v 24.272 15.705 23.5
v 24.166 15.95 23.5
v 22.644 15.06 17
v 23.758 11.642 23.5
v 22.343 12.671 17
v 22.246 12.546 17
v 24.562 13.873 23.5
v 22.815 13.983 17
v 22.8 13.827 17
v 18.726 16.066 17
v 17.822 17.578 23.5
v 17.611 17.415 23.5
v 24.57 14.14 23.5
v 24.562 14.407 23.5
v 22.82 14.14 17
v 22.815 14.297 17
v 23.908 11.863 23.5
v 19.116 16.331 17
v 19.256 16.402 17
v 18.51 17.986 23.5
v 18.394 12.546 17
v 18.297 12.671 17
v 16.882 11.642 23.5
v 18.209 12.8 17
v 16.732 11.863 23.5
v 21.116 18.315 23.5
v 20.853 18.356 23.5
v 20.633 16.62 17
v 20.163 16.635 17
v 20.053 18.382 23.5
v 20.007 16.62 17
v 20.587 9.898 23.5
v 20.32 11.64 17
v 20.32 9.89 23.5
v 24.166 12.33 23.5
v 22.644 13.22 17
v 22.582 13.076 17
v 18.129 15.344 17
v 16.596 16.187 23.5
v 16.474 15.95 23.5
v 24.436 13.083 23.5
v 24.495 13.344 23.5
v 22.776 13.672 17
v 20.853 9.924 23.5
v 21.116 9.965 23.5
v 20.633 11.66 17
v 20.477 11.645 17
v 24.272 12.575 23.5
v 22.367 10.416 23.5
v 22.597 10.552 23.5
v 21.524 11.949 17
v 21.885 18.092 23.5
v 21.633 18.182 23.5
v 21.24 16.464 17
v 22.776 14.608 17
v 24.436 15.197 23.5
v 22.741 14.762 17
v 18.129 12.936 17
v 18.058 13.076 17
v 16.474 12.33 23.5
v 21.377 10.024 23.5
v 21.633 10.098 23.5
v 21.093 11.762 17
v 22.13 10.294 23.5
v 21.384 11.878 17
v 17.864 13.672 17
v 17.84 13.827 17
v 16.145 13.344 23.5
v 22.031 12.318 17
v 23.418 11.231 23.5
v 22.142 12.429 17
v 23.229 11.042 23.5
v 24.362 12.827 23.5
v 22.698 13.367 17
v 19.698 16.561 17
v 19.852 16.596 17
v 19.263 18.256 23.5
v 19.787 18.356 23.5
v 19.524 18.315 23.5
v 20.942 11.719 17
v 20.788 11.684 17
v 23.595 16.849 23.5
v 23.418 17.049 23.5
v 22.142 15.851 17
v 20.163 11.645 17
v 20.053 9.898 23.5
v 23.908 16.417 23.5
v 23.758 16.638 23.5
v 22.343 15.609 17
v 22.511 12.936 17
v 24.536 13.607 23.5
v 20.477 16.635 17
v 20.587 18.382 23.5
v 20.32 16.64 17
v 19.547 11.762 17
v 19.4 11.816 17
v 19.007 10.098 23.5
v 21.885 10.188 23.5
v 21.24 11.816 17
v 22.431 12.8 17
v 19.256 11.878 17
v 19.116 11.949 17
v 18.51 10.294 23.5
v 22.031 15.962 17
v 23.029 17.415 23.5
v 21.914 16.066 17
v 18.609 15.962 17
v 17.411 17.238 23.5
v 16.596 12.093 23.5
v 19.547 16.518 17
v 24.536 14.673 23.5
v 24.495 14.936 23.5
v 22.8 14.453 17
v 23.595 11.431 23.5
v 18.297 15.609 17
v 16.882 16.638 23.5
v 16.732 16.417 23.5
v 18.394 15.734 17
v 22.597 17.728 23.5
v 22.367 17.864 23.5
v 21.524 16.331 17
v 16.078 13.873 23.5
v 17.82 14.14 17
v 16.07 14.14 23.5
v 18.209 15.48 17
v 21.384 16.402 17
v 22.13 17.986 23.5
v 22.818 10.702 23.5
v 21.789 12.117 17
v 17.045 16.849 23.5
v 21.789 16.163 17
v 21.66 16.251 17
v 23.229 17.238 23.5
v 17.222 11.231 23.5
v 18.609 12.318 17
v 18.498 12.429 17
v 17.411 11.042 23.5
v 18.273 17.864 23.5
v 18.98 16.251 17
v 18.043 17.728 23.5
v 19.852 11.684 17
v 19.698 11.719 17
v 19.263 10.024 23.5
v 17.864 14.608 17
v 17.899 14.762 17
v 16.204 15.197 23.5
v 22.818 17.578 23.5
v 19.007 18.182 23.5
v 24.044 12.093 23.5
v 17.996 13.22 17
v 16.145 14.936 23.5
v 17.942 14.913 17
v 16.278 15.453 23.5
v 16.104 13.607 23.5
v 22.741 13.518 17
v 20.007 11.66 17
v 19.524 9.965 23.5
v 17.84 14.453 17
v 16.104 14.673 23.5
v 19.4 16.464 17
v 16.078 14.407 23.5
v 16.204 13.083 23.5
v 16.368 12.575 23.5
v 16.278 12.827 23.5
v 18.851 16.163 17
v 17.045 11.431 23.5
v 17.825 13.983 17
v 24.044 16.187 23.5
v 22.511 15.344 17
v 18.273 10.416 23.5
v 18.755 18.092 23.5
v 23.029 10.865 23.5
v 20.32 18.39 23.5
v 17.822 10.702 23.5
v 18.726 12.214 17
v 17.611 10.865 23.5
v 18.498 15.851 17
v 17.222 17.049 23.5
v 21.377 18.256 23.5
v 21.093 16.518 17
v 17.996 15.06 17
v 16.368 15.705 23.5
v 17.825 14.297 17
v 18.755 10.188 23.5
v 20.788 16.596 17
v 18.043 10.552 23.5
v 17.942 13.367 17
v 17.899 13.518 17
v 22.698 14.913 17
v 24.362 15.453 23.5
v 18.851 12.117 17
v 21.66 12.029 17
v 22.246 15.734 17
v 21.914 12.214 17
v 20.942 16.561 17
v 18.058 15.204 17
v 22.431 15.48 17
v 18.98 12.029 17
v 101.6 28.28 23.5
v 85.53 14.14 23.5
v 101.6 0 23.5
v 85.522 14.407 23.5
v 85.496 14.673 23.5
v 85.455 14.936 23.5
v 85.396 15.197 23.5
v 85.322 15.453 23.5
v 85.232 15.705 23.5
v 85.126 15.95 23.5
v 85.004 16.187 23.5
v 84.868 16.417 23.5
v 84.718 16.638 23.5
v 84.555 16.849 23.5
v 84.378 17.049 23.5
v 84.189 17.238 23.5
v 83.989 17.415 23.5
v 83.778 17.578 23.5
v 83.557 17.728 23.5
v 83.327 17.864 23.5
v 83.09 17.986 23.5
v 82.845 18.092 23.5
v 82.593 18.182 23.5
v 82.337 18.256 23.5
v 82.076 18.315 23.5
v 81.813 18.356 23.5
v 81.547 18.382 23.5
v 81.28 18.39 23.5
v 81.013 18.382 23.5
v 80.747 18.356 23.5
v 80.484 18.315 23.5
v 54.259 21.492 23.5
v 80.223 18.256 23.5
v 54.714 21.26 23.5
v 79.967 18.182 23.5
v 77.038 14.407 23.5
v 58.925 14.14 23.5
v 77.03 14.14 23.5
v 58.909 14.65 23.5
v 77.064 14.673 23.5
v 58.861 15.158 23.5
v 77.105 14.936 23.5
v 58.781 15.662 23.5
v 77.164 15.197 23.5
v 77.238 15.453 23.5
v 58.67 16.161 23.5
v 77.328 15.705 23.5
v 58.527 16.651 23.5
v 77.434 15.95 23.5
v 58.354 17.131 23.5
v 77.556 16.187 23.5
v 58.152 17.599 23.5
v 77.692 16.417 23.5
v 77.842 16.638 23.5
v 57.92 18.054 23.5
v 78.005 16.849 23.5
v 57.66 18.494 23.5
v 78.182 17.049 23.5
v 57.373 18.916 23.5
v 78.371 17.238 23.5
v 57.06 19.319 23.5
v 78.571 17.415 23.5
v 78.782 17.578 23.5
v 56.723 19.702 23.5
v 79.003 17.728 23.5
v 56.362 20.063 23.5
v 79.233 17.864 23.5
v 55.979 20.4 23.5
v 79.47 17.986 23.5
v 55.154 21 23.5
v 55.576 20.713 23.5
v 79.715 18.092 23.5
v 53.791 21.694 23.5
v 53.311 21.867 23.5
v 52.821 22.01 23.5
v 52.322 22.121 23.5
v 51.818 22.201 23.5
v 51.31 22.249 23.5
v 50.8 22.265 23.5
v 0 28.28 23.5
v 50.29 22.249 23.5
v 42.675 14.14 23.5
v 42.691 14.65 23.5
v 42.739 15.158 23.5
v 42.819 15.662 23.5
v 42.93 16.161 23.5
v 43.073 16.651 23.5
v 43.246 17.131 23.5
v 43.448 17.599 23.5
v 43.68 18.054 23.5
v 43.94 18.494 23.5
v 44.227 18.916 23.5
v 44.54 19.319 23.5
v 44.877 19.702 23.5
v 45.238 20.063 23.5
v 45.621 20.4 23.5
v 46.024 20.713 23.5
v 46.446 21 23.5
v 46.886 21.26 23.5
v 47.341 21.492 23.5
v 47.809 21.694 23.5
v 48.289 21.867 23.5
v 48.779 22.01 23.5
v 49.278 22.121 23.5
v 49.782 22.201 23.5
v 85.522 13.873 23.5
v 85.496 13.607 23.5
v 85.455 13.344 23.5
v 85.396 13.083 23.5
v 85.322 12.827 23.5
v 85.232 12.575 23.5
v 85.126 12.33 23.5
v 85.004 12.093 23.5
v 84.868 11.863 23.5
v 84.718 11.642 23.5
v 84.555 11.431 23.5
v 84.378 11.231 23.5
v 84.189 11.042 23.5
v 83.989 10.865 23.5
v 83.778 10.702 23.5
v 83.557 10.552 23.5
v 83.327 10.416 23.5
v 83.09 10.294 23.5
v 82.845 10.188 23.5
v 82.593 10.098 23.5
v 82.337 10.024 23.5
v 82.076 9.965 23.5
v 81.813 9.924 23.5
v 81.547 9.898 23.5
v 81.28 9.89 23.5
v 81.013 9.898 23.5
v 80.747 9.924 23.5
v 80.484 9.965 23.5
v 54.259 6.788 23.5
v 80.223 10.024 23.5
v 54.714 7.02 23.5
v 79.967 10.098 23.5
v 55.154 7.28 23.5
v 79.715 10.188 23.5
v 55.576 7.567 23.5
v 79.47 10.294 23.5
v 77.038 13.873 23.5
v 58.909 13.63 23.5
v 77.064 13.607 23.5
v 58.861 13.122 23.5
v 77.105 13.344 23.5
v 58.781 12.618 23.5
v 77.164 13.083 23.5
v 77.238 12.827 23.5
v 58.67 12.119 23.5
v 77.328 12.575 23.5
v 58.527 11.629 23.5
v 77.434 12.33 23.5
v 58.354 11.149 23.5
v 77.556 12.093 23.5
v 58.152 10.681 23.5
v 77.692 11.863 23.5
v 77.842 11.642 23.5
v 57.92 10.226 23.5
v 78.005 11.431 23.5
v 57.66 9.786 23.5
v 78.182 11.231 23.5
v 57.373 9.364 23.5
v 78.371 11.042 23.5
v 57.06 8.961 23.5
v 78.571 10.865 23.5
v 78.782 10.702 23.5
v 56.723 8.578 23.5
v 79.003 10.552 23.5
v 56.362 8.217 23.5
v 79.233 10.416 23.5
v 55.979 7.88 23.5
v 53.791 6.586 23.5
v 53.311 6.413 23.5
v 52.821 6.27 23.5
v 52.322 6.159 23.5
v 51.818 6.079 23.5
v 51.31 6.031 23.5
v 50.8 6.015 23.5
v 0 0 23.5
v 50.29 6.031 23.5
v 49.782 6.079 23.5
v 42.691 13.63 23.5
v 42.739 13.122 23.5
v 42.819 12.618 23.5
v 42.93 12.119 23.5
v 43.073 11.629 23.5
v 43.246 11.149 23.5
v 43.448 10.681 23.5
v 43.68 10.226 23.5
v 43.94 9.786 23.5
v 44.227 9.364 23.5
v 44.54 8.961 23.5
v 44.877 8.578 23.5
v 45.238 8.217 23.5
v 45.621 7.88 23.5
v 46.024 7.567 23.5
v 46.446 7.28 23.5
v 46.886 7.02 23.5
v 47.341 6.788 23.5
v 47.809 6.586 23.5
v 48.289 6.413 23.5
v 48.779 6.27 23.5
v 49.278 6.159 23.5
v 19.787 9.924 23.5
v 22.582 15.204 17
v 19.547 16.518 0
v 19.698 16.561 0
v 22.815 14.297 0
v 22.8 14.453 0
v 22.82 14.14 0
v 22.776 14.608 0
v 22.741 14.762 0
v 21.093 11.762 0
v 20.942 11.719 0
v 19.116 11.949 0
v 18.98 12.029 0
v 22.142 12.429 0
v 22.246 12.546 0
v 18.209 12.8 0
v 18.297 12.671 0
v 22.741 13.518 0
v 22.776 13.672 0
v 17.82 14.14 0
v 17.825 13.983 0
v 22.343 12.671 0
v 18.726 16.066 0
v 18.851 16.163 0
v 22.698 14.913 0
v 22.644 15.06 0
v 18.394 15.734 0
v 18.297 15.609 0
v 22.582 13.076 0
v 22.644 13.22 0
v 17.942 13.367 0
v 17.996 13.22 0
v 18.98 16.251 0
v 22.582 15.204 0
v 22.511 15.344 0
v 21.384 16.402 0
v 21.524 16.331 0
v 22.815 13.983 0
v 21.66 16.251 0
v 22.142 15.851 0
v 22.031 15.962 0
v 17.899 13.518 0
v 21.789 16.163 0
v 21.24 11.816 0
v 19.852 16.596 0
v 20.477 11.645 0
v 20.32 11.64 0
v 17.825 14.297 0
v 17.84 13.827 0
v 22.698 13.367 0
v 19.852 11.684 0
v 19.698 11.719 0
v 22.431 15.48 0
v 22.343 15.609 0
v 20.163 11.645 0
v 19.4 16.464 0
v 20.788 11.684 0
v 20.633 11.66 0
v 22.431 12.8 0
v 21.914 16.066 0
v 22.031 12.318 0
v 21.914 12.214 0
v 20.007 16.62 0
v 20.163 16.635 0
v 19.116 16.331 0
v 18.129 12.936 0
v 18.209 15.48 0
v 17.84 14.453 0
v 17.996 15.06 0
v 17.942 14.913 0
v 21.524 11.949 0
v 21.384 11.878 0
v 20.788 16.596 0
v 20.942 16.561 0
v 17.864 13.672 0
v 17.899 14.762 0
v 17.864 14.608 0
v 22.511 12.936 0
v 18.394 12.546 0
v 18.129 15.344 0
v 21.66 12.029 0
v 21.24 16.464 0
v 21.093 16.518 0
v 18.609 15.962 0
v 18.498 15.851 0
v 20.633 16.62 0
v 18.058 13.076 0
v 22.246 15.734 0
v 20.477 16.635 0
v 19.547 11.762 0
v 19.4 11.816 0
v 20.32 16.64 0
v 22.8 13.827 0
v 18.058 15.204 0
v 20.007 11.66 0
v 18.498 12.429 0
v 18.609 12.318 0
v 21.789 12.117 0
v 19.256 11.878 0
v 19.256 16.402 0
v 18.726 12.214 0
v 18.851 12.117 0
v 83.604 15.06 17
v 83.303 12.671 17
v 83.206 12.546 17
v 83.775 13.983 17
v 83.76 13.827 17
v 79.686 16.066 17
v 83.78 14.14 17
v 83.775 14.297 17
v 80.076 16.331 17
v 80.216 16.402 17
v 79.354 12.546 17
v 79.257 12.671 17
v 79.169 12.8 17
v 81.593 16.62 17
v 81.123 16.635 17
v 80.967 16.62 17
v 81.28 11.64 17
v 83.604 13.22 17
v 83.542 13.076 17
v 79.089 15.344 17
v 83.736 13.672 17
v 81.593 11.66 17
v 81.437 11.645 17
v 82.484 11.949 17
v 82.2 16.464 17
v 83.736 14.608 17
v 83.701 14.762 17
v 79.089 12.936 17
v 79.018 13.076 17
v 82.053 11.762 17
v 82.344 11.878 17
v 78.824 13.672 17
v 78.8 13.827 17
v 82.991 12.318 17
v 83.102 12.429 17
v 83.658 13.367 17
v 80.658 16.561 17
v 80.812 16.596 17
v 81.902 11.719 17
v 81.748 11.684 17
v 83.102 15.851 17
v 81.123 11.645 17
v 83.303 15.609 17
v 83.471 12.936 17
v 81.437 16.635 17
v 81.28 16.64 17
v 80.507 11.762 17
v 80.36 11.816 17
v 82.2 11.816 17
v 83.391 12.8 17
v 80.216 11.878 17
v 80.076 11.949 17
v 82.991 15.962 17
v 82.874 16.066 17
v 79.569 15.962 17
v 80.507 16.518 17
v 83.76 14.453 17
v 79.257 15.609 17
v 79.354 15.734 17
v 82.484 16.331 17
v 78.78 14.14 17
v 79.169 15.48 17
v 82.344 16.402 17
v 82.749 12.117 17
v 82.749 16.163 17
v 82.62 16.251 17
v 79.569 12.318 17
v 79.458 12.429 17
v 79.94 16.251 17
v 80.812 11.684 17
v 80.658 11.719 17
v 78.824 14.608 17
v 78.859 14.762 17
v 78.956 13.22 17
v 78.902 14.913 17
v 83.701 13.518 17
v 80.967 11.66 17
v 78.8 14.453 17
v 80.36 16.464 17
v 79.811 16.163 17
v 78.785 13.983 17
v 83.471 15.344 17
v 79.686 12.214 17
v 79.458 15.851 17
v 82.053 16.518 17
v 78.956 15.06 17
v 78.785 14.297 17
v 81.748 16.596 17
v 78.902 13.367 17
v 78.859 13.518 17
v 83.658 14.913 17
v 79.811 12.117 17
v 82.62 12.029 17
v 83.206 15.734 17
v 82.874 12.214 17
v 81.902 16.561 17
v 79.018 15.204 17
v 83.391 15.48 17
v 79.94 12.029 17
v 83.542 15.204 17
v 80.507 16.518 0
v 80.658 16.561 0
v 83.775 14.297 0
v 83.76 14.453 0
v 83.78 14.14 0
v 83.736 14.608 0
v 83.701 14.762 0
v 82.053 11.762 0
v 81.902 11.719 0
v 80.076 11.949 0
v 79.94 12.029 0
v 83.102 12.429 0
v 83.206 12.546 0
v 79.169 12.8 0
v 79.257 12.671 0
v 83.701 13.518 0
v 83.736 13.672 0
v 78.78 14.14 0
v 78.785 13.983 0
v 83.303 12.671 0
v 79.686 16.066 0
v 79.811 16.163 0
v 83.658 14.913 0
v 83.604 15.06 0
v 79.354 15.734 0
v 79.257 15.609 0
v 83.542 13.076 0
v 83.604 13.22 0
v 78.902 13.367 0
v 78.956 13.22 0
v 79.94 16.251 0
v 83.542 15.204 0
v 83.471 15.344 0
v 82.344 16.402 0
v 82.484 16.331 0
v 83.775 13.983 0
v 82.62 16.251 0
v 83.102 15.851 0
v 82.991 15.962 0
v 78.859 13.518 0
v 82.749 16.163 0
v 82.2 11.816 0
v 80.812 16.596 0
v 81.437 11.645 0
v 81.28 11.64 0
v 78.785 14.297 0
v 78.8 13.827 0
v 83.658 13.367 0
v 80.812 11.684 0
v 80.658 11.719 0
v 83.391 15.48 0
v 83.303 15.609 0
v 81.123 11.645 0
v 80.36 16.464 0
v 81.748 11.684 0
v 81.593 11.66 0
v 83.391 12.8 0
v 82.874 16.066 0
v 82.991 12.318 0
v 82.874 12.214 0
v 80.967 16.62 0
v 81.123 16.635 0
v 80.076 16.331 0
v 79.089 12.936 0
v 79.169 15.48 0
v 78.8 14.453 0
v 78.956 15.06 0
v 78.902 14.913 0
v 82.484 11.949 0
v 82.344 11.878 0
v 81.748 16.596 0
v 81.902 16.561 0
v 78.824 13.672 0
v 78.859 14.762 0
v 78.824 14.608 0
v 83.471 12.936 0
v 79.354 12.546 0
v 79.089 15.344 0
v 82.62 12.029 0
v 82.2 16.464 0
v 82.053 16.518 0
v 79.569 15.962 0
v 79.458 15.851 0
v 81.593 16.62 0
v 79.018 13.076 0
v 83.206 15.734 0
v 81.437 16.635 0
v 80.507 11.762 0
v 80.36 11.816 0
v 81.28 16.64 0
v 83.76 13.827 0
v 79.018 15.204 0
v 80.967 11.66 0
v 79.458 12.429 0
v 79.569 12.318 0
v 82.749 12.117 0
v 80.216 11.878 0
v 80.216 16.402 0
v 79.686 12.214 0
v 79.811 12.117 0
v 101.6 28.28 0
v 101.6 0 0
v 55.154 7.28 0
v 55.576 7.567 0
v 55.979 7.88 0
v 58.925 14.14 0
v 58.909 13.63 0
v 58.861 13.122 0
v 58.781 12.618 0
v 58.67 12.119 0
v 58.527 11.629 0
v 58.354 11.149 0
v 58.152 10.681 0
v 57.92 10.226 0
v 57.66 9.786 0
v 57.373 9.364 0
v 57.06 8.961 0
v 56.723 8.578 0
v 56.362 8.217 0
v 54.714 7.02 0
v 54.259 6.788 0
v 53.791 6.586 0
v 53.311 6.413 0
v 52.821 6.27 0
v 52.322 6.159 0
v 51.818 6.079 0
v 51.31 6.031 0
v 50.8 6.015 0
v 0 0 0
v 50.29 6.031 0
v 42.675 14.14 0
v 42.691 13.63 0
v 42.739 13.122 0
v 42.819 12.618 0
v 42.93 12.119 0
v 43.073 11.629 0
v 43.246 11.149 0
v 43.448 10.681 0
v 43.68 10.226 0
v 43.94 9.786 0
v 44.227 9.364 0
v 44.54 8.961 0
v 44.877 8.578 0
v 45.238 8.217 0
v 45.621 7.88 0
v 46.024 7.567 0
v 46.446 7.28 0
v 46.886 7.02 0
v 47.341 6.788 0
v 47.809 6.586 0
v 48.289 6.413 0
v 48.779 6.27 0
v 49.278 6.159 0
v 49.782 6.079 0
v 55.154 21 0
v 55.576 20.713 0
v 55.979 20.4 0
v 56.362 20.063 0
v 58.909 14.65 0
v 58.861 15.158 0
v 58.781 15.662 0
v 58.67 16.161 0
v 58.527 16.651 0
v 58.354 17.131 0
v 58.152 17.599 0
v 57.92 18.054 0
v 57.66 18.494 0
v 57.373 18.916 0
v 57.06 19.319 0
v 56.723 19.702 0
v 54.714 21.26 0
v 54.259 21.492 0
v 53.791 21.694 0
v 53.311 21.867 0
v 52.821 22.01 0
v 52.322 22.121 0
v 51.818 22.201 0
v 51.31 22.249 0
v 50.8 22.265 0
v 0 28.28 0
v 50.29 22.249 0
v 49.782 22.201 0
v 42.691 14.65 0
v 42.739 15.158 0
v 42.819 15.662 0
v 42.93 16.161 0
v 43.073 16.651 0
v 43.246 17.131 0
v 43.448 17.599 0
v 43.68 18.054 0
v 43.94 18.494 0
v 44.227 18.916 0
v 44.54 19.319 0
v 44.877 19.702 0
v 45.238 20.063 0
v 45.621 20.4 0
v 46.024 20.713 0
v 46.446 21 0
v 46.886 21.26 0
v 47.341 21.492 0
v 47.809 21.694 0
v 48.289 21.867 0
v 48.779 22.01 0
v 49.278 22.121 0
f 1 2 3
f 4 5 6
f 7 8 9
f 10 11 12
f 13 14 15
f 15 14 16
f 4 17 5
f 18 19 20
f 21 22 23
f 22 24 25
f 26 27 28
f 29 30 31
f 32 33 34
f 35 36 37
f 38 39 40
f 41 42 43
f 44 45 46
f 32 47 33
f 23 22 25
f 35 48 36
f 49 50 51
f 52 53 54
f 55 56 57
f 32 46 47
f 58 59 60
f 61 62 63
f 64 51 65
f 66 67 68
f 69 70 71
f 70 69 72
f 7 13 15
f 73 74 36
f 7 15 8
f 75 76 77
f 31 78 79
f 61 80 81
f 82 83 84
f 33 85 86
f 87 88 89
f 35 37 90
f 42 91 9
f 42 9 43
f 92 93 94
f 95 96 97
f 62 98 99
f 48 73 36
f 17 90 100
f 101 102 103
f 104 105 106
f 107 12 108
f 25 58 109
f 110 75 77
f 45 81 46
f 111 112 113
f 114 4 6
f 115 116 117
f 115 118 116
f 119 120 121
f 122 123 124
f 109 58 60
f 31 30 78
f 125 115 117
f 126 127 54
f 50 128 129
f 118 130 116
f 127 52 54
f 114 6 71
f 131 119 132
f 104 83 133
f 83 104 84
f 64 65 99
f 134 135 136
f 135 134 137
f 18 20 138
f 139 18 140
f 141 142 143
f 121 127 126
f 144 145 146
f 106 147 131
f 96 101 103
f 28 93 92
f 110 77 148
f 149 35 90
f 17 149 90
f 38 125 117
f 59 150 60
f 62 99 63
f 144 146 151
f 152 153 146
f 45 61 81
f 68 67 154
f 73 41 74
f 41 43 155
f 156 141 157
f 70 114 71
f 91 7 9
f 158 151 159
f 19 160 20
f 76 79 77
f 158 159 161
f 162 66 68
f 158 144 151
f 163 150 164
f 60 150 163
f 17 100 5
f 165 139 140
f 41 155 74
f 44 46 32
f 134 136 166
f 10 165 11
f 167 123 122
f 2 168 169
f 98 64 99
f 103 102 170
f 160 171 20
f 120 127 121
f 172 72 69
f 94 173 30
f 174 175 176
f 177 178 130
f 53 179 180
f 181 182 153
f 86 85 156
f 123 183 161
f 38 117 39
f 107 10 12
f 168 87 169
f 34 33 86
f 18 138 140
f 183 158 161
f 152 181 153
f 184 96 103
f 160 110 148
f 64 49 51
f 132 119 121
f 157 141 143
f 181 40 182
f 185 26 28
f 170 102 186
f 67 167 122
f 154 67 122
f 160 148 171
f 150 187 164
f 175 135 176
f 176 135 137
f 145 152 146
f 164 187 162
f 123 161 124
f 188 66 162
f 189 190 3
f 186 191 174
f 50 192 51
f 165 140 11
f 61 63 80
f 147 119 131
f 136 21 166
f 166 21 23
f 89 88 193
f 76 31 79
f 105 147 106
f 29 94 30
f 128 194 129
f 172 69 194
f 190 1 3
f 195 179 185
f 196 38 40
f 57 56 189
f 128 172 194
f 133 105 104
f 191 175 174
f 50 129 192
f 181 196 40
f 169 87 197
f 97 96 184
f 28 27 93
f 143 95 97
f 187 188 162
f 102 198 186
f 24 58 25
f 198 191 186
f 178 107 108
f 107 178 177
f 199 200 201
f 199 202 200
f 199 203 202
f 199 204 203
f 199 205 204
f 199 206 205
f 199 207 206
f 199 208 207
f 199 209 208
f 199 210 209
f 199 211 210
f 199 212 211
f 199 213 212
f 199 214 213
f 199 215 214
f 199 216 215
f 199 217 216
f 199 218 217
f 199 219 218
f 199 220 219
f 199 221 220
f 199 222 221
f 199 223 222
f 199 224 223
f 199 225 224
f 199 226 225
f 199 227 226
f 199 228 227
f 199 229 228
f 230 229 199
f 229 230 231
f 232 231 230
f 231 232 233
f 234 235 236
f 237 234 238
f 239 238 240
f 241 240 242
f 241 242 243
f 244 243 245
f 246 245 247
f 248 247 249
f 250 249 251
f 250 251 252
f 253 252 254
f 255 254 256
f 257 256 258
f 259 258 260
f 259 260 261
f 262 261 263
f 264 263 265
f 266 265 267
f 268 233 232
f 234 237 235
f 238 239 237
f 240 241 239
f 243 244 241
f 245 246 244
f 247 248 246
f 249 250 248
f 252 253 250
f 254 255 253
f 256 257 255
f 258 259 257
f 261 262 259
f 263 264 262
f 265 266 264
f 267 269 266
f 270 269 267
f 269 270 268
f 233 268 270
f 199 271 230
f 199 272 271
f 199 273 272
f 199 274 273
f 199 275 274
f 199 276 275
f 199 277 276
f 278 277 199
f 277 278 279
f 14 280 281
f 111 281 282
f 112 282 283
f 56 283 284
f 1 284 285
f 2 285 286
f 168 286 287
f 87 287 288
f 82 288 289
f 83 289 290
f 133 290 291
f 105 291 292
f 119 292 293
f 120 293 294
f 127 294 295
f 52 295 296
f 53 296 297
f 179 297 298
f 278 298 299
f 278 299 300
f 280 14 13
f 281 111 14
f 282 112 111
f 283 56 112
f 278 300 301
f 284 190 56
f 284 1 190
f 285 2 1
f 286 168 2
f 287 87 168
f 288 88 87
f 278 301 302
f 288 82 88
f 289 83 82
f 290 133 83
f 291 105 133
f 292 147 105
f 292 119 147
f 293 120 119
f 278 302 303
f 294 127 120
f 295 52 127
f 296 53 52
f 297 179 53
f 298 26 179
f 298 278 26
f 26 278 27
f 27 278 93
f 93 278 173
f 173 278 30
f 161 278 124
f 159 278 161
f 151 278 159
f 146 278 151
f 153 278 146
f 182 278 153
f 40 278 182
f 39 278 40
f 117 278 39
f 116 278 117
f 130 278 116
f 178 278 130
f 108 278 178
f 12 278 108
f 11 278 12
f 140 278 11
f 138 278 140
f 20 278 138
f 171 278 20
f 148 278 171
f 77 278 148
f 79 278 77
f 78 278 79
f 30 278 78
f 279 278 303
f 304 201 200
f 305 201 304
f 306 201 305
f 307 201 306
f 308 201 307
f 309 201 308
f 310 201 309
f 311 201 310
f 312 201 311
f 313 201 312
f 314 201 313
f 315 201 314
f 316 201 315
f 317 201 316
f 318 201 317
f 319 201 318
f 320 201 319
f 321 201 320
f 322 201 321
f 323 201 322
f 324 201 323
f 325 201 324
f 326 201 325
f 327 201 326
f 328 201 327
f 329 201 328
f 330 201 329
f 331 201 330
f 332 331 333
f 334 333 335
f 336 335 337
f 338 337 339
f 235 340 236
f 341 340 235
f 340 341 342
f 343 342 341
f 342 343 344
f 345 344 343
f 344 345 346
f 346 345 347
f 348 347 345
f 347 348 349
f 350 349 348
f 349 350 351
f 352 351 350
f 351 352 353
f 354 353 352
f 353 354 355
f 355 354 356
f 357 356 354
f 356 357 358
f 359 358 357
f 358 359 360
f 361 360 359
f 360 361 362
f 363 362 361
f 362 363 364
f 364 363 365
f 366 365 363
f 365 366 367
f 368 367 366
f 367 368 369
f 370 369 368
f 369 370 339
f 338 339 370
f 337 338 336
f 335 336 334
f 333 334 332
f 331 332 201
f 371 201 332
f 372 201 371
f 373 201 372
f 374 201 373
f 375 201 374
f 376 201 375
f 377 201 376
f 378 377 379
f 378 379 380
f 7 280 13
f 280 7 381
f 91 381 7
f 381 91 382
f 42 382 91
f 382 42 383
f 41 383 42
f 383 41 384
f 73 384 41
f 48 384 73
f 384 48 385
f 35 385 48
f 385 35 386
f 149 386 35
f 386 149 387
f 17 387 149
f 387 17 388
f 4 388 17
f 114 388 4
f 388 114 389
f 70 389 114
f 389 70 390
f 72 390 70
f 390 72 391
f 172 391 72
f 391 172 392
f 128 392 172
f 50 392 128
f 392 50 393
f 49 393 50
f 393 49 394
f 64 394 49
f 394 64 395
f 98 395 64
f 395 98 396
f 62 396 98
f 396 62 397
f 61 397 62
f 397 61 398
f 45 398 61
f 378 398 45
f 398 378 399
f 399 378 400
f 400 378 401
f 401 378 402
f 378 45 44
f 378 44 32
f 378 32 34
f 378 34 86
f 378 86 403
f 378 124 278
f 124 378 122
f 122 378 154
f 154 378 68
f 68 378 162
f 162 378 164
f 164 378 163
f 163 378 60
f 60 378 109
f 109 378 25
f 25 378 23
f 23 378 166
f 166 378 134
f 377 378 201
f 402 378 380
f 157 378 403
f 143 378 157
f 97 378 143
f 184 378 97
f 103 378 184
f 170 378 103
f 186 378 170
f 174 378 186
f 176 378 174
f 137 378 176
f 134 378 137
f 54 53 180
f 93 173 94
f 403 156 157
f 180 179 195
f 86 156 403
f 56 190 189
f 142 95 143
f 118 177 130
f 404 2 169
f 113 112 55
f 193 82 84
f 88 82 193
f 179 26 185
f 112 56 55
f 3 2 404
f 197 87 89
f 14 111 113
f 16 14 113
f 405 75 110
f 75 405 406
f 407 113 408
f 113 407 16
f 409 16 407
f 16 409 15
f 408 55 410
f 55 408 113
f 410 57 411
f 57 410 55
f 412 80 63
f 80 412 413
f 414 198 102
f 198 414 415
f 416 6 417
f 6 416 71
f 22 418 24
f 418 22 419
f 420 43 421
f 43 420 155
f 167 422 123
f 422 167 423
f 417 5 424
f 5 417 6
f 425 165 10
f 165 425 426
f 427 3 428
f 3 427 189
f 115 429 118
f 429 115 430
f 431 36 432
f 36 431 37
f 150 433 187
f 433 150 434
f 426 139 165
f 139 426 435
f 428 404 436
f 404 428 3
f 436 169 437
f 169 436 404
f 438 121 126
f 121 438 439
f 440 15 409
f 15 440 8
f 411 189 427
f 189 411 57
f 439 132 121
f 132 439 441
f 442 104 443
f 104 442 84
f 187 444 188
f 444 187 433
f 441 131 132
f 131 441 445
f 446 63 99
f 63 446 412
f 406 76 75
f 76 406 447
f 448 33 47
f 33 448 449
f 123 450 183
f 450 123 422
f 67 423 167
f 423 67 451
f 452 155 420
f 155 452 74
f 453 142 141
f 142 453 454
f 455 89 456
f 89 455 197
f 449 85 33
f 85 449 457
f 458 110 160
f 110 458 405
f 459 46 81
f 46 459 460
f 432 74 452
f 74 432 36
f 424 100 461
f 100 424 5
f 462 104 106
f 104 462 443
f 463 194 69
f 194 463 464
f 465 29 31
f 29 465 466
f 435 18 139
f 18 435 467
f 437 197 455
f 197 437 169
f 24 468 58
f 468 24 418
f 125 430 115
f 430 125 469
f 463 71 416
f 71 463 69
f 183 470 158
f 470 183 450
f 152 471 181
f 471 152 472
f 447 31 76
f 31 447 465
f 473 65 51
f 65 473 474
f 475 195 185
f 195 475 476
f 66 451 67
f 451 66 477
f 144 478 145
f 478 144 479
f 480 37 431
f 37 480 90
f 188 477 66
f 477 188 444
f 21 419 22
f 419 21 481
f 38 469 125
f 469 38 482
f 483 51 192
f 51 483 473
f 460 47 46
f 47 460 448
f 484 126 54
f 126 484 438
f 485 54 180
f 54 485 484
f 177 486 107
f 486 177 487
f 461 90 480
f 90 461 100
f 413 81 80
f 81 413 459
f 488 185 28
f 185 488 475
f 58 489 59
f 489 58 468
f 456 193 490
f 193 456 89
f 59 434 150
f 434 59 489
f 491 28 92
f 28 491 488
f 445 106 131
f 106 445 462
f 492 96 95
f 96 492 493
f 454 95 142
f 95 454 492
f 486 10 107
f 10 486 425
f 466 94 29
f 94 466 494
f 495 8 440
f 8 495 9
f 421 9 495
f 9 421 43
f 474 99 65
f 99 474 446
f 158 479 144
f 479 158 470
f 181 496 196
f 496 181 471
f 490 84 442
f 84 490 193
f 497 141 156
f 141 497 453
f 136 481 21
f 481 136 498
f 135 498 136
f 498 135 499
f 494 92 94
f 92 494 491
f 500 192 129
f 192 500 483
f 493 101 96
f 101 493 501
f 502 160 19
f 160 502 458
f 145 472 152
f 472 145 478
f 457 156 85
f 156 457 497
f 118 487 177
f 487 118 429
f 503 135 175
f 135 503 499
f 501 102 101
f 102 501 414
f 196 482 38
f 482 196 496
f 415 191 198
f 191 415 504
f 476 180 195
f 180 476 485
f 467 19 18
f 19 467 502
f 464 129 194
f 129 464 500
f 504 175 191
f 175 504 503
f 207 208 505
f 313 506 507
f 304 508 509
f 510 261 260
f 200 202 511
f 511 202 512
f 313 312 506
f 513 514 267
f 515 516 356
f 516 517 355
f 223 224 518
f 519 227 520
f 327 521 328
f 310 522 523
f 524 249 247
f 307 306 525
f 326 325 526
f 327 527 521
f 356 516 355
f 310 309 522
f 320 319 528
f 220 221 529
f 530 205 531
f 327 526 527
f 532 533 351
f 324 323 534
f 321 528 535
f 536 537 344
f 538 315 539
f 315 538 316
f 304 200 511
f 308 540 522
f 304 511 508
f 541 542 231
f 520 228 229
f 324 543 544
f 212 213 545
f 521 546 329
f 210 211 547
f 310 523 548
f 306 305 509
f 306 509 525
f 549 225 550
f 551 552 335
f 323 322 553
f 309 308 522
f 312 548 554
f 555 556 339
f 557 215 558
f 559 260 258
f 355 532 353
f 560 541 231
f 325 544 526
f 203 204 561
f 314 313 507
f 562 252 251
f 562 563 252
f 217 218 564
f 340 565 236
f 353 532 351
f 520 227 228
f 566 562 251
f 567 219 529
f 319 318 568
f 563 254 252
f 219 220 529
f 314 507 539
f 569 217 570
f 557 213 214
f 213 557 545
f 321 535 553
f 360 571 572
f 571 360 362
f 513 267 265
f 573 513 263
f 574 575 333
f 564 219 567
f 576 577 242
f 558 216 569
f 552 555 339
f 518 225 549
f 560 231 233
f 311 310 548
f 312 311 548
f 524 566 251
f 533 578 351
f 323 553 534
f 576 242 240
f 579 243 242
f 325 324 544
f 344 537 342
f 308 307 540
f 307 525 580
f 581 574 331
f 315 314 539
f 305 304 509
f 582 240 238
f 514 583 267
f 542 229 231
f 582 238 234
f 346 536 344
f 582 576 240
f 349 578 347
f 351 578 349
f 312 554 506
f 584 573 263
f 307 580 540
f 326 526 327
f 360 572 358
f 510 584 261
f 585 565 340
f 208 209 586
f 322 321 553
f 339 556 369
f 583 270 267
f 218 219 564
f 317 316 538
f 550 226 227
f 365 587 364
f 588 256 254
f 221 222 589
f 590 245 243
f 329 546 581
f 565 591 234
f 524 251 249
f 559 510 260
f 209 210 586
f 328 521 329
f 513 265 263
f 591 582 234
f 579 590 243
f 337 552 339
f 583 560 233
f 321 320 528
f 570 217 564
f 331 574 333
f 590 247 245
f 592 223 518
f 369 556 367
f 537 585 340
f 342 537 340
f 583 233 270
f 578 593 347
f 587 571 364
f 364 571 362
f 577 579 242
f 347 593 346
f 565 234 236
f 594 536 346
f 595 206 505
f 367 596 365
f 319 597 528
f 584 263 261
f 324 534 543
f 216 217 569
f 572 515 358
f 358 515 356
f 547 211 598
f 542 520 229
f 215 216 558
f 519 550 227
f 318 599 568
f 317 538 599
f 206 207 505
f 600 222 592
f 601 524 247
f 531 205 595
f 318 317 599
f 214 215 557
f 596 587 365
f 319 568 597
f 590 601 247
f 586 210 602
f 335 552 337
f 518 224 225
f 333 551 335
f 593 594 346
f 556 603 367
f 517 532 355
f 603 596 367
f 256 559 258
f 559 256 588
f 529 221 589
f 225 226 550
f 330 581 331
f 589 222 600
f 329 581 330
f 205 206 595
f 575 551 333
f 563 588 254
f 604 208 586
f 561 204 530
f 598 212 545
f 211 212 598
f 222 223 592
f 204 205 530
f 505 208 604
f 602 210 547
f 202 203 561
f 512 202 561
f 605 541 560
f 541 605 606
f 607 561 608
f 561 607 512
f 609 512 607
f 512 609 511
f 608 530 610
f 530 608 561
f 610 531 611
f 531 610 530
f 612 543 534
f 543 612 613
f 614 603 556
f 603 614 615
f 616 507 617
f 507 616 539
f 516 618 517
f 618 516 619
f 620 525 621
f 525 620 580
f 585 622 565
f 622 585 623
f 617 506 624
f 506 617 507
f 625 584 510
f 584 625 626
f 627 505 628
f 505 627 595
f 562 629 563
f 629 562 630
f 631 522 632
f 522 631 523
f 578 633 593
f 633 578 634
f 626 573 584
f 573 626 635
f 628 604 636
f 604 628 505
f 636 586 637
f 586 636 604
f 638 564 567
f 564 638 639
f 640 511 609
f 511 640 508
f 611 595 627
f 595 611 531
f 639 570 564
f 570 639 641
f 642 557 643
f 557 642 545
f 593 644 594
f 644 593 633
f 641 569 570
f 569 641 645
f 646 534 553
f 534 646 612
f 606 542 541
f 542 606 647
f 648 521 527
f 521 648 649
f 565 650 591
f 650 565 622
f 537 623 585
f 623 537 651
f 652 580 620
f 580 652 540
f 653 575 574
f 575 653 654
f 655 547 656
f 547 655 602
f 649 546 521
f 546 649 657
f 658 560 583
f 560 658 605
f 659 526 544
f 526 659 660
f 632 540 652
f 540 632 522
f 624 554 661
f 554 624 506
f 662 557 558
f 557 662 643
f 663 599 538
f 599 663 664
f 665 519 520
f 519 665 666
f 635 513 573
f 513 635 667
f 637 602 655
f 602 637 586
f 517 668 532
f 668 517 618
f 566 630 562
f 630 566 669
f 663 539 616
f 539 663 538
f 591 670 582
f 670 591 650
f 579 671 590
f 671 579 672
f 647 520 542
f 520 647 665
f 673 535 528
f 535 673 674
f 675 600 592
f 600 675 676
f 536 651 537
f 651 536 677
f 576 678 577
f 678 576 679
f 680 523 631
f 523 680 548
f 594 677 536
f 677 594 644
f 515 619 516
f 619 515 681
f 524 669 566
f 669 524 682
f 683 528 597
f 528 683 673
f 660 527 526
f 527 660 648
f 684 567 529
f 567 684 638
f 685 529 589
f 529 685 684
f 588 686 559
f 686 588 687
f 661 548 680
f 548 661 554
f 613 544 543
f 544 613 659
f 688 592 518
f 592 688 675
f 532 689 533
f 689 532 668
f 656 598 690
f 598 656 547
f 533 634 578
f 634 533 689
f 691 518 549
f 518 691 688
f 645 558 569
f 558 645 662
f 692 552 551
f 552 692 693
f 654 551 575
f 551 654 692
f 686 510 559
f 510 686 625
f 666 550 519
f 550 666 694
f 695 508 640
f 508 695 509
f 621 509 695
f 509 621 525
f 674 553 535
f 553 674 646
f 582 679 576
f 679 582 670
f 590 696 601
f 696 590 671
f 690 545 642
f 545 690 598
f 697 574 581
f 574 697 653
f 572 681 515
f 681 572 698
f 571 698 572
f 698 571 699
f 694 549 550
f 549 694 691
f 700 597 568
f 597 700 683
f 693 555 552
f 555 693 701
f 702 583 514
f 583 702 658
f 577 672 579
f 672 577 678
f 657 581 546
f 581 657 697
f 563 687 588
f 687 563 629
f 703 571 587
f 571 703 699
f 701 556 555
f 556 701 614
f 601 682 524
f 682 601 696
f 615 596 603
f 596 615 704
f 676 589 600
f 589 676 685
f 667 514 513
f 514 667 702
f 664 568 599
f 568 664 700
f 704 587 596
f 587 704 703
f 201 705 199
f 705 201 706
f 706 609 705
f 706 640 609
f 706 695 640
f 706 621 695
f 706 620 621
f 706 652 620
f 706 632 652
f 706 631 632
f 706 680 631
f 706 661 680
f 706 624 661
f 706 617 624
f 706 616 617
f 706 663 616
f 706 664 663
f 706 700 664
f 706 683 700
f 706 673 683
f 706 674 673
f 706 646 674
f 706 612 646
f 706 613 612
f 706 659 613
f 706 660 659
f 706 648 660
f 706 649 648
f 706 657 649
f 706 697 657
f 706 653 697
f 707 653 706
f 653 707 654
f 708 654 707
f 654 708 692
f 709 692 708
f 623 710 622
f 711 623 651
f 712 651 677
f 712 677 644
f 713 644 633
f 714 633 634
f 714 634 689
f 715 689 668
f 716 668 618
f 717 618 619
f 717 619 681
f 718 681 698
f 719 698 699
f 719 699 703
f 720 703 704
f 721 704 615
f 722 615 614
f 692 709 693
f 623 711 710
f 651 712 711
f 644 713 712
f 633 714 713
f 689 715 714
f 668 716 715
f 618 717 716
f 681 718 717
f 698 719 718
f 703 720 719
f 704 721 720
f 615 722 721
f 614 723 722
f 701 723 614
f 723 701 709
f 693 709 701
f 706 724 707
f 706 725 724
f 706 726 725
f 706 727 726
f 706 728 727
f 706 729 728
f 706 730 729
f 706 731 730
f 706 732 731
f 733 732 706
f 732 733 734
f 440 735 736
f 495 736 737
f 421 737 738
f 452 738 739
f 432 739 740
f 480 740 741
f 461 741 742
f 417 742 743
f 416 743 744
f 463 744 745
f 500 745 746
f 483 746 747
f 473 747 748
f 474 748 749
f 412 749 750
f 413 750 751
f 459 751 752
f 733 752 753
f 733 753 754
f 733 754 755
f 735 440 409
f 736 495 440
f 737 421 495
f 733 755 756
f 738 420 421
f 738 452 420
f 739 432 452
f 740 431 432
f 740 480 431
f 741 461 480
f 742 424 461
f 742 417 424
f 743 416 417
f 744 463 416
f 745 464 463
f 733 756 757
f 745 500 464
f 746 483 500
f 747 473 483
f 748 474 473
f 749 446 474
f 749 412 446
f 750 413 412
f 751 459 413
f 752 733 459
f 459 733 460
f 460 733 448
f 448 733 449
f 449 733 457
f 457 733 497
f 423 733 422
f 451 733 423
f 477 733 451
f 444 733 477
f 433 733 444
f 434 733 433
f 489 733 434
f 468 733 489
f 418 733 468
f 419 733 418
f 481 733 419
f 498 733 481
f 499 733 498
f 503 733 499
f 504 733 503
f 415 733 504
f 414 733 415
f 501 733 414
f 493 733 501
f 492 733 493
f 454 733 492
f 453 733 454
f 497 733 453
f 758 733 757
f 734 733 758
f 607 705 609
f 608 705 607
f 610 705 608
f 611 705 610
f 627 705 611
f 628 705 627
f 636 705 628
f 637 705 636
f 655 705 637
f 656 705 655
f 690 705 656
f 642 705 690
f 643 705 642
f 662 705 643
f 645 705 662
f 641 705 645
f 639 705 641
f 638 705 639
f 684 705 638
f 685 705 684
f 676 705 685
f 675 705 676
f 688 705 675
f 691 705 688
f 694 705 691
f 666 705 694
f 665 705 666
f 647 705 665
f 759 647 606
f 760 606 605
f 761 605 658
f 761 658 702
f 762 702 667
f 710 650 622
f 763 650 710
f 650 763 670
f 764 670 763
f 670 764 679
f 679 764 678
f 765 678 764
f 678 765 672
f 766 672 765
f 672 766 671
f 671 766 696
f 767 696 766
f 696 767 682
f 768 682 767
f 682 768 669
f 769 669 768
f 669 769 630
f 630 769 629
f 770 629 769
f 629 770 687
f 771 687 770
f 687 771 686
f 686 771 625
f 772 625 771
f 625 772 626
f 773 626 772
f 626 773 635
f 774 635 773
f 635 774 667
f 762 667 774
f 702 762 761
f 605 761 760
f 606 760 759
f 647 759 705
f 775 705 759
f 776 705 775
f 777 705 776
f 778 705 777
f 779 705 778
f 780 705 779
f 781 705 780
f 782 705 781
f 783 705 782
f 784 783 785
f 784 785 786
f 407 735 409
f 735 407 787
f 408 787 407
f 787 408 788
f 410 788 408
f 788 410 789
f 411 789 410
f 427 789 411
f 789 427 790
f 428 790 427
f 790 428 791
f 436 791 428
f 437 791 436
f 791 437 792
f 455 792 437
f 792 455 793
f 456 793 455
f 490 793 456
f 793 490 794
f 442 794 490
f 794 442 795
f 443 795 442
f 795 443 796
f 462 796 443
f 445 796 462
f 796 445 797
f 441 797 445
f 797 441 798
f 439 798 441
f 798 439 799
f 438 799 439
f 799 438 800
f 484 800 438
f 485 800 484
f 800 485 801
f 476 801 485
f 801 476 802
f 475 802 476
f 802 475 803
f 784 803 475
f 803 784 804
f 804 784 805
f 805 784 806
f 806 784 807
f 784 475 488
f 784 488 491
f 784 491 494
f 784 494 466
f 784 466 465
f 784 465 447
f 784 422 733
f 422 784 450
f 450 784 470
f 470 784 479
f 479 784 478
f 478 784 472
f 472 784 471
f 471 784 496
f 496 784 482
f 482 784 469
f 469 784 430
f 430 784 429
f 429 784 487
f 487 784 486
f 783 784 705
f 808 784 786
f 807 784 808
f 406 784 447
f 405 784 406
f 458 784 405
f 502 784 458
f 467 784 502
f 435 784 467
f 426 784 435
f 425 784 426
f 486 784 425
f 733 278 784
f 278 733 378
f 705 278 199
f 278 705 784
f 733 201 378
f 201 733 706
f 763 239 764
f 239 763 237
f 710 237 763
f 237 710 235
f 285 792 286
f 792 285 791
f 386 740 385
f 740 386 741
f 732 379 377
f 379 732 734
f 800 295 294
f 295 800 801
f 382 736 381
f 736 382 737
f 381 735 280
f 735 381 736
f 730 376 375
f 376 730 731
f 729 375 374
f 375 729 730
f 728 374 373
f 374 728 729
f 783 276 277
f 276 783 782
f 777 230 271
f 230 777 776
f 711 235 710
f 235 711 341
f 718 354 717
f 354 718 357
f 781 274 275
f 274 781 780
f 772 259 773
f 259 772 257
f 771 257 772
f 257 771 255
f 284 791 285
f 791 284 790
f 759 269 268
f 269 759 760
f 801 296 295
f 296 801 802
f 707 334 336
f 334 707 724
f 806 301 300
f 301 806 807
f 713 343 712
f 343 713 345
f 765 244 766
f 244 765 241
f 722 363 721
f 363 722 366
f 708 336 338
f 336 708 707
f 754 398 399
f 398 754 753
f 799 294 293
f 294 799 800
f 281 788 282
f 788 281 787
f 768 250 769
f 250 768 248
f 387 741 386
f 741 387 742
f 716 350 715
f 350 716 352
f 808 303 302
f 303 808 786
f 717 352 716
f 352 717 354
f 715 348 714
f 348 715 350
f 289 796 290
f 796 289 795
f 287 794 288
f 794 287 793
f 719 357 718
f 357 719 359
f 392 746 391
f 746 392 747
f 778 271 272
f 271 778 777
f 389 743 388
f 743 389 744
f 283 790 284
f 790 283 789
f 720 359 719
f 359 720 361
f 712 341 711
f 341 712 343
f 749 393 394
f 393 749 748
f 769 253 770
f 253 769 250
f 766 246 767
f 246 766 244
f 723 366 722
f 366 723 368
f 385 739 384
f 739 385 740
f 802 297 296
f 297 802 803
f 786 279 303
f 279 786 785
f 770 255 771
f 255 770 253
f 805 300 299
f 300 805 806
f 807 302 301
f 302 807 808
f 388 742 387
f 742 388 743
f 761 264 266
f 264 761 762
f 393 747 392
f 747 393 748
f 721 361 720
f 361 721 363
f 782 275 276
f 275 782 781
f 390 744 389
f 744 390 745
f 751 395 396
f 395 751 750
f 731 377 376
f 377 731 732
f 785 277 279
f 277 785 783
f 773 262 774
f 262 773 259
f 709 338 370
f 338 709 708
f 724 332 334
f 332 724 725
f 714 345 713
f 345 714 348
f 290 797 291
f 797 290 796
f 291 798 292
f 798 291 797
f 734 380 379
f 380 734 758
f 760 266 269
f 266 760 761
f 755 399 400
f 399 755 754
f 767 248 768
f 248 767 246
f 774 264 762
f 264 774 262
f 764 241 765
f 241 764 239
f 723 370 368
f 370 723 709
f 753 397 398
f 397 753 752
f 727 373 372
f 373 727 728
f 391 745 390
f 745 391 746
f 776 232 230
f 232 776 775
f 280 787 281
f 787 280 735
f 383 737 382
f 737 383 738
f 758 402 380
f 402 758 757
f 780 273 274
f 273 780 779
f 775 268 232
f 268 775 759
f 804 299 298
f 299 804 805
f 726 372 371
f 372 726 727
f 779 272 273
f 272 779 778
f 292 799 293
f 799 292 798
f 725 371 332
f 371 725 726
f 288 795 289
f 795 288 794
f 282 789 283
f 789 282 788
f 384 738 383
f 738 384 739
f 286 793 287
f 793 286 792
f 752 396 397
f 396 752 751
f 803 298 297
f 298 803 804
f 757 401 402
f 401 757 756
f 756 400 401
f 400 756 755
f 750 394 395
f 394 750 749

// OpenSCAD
inch = 25.4;
board_x =  4 * inch;
board_y = 28.28;
board_z = 23.5;

peg_hole_r = 16.25 / 2;
screw_head_r = 8.5 / 2;
screw_head_length = 6.5;
screwn_shaft_r = 5 / 2;
screw_length = 63;

screw_hole_z_offset = 10;

$fn = 100;


module screw(screw_length, screw_head_length, screwn_shaft_r, screw_head_r) {
    union() {
        translate([0, 0, screw_length]) {
            cylinder(screw_head_length, screwn_shaft_r, screw_head_r);
        }
        cylinder(h = screw_length, r = screwn_shaft_r);
    }
} 


difference() {
    cube([board_x, board_y, board_z]);
    
    translate([(board_x / 2), (board_y / 2), 0]) {
        cylinder(h = screw_length, r = peg_hole_r);
    }

    translate([(board_x / 5), (board_y / 2), ((-screw_length - screw_head_length) + board_z)]) {
        screw(screw_length, screw_head_length, screwn_shaft_r, screw_head_r);
    }
    
    translate([(board_x - (board_x / 5)), (board_y / 2), ((-screw_length - screw_head_length) + board_z)]) {
        screw(screw_length, screw_head_length, screwn_shaft_r, screw_head_r);
    }
}
